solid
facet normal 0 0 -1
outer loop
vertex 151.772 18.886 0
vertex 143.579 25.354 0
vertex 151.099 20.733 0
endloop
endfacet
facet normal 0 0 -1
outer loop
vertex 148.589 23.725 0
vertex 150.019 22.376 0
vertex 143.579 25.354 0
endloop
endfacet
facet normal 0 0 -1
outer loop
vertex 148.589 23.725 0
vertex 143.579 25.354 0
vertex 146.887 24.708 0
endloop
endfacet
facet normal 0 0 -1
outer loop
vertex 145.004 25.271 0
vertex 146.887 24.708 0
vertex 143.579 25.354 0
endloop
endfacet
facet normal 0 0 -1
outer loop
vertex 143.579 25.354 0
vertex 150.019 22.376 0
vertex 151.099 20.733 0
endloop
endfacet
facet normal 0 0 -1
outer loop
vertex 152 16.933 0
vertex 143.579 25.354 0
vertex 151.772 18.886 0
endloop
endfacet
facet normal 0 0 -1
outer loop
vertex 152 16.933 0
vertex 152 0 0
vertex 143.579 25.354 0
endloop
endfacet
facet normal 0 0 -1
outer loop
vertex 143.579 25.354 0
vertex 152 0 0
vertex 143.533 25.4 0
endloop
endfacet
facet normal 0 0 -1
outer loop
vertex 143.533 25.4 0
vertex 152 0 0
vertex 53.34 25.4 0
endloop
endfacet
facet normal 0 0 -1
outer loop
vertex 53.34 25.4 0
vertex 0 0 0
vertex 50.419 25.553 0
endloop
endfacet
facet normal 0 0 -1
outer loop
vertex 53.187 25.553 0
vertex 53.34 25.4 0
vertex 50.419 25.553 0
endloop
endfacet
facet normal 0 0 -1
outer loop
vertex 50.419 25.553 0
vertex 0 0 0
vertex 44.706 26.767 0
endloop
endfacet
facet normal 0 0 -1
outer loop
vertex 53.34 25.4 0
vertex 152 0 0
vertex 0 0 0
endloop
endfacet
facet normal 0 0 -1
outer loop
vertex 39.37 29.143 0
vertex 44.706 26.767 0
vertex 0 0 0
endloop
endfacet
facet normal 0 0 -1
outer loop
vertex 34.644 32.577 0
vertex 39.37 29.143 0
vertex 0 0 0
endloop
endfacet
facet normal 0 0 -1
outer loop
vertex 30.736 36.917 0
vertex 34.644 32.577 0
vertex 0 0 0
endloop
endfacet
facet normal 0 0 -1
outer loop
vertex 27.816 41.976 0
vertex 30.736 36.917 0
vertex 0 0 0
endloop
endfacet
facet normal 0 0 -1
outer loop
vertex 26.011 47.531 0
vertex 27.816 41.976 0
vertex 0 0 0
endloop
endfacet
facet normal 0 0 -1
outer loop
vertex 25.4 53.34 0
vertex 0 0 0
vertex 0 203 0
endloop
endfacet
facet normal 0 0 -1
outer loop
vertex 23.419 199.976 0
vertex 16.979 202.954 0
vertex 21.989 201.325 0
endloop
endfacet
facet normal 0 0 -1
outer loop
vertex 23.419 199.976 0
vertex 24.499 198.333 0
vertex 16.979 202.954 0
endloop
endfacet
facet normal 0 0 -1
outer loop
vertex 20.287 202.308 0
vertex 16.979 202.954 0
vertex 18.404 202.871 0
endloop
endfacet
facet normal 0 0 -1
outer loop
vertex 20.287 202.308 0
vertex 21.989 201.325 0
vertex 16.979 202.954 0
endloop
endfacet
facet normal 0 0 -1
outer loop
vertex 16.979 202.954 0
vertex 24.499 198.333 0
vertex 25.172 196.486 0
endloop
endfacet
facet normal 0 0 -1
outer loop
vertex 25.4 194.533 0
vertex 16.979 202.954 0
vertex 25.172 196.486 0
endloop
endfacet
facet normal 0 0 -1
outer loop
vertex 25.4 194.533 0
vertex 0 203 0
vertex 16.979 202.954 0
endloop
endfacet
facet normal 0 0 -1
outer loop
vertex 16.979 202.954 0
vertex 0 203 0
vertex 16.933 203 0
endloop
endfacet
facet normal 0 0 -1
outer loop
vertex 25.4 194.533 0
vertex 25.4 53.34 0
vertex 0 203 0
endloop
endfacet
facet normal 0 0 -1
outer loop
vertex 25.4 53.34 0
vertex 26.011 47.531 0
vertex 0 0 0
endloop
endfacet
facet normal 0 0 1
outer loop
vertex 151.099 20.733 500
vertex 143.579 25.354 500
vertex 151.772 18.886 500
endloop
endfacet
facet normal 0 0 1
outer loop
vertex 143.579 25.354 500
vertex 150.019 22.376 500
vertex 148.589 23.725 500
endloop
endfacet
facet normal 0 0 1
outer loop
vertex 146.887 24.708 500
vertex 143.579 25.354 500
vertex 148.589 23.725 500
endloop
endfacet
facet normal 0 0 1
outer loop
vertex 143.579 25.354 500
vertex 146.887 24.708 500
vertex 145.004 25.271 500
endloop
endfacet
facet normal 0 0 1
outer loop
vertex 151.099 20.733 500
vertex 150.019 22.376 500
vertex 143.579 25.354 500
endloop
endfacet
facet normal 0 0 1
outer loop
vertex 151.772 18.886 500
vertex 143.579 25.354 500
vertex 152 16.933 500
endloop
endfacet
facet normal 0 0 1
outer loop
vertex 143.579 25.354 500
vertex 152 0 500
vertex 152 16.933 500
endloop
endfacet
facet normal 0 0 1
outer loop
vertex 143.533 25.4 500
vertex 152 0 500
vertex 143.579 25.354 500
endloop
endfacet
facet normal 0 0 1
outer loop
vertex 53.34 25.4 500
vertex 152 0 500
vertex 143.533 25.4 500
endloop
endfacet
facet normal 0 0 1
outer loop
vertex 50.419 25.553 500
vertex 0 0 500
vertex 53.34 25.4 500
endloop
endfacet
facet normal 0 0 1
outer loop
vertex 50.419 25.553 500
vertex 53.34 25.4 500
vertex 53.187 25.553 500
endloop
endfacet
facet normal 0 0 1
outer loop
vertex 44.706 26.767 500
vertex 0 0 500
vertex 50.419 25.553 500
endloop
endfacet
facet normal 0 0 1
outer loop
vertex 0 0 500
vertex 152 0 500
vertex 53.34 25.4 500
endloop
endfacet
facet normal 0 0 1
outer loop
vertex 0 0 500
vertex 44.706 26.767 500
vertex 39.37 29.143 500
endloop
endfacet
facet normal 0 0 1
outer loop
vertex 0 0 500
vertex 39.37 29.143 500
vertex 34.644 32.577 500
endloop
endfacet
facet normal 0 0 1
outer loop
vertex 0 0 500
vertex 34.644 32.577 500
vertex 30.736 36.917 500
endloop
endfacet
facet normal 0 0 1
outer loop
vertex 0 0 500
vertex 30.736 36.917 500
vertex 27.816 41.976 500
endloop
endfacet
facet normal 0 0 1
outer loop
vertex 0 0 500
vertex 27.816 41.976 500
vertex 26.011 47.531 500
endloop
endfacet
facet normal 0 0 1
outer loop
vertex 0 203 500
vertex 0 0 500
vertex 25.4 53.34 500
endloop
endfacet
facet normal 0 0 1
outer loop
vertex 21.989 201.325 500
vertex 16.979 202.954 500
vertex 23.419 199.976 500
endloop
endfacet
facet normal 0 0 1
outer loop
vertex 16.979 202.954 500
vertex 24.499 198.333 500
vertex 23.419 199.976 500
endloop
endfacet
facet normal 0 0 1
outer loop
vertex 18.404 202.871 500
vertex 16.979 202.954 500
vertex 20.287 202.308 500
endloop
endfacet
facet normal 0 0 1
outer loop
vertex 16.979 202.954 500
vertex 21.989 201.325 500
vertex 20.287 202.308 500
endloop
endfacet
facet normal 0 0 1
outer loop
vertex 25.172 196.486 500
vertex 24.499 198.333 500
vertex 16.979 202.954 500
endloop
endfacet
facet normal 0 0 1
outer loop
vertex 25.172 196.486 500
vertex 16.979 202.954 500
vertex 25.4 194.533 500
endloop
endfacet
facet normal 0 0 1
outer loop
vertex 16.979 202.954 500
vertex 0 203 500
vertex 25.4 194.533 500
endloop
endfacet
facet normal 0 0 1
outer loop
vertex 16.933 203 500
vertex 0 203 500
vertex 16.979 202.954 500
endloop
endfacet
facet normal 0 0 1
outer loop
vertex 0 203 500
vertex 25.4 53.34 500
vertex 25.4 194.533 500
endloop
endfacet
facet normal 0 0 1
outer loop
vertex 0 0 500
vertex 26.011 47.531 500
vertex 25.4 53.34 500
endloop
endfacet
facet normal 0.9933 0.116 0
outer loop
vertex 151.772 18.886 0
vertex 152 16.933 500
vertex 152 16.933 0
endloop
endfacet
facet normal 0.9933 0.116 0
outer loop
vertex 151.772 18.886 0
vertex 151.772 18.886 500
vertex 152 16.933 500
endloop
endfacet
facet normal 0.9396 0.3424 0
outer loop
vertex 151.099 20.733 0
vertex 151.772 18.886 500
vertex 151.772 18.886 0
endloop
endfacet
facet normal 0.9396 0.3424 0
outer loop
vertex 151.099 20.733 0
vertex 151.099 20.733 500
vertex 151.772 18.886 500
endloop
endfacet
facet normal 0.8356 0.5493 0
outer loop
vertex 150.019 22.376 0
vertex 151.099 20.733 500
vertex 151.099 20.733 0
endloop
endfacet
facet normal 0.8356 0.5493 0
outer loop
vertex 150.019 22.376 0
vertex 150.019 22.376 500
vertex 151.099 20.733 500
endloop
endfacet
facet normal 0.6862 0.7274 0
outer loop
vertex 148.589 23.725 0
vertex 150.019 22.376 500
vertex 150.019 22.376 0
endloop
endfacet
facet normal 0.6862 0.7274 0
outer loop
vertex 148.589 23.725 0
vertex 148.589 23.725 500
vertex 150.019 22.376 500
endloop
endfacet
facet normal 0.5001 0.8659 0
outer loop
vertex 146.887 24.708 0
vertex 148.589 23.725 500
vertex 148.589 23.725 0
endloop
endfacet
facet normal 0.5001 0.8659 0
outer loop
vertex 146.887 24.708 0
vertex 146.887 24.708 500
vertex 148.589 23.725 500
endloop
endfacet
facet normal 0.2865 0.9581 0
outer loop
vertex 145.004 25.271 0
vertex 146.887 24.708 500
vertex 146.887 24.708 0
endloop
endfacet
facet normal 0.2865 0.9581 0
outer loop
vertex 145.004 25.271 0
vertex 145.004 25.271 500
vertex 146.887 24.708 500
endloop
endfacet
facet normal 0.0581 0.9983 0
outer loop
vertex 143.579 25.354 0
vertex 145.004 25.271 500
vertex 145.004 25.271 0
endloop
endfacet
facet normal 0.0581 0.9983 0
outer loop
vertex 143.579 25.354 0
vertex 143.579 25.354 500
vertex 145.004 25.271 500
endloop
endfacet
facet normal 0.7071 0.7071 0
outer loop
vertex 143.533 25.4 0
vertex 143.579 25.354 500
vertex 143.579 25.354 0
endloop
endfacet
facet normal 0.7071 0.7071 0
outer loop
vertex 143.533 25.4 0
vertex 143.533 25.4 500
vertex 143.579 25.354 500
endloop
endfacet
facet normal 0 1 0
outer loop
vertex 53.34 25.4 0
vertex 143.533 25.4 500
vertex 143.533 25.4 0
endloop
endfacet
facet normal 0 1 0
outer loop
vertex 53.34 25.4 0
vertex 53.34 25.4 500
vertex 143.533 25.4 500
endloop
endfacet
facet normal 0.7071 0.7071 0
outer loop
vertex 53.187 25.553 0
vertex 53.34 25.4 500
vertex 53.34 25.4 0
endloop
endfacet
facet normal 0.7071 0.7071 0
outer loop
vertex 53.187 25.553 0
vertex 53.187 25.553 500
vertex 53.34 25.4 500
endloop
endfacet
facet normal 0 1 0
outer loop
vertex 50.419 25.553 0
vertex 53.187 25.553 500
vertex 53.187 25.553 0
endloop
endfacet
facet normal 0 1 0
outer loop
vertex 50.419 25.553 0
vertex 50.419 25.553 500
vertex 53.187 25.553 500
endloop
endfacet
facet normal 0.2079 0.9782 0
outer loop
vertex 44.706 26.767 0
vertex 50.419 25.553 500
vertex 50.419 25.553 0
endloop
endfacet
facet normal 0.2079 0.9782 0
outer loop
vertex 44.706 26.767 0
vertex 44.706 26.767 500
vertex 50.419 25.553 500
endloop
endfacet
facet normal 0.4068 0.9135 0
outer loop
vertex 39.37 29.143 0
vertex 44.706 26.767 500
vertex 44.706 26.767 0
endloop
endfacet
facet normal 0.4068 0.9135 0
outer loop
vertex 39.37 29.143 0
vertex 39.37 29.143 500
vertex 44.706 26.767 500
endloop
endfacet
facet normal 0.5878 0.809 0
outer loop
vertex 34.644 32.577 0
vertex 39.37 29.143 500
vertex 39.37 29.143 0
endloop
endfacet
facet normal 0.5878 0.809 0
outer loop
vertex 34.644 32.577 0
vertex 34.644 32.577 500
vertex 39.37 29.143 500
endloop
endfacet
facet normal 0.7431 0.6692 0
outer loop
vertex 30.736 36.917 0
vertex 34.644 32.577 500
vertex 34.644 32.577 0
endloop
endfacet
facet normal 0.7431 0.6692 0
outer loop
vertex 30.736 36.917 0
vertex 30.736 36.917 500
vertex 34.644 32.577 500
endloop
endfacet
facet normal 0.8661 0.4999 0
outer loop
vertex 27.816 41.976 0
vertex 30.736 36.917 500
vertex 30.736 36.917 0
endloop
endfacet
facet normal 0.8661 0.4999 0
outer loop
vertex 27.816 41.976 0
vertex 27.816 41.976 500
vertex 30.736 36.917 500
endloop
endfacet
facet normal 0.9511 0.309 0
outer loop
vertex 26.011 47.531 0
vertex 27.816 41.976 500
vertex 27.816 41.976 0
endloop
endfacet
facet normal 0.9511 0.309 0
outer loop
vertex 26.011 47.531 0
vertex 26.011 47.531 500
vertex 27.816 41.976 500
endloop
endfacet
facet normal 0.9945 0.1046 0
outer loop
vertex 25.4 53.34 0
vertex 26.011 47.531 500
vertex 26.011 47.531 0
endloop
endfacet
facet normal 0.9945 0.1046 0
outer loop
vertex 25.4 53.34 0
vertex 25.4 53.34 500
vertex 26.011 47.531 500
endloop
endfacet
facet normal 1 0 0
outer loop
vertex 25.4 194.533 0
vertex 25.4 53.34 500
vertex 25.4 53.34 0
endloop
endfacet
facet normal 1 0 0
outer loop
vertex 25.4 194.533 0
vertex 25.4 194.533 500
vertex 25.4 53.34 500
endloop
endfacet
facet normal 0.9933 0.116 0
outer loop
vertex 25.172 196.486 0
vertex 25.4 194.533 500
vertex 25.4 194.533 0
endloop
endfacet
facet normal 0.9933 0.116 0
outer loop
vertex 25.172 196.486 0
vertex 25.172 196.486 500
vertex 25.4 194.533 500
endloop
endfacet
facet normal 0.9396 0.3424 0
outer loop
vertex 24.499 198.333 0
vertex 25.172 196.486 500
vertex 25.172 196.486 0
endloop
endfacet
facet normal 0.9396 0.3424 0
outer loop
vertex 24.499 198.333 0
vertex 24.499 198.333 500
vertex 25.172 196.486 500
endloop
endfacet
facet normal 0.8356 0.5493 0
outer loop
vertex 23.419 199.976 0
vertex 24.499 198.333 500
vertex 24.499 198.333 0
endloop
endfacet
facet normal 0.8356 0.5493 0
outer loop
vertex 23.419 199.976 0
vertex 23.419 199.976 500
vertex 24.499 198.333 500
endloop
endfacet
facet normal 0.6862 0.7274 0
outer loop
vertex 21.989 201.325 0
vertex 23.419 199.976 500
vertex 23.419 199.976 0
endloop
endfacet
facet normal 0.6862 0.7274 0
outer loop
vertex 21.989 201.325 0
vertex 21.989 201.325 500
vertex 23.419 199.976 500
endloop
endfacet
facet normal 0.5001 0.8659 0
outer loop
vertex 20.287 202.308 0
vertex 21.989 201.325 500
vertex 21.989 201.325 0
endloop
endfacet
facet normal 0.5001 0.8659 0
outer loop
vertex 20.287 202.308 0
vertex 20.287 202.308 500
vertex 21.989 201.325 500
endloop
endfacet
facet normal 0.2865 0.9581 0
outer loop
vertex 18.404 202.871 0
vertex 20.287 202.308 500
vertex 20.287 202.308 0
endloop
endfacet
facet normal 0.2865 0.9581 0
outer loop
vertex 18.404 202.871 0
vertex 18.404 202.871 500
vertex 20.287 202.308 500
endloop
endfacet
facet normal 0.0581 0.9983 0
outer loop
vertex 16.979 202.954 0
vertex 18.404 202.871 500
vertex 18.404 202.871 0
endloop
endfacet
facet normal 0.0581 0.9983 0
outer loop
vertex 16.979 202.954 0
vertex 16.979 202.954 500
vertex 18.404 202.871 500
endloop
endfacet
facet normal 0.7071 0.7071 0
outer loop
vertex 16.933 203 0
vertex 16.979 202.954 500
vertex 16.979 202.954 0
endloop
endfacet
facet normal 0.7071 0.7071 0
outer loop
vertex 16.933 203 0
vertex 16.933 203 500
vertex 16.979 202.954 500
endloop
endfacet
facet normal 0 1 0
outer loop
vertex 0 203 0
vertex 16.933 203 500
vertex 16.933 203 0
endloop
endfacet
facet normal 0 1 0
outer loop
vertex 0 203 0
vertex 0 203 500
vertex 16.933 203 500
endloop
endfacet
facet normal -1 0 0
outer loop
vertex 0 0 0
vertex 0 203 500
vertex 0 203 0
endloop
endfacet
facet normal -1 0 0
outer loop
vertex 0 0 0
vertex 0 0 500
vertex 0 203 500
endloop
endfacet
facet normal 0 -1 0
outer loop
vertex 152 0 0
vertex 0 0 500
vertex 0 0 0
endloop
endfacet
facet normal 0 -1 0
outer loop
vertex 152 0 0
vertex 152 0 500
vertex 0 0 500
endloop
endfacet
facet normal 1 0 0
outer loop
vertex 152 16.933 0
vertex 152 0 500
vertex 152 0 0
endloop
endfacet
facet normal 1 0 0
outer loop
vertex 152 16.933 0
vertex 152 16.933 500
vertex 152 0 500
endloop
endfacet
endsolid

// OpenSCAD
module L(d,b,t,l=300,k=undef,r2=undef) {
    k = k==undef ? 2.1*t : k;  // not tabulated for angles
    r1 = k - t;     // radius of leg to leg fillet.
    r2 = r2==undef ? t/3 : r2;    // radius of leg tip fillet
    pts = [[0,0],   // heel at origin
                [b,0],   // leg in x-dir
                [b,t-r2],
                [b-r2,t],
                [t+r1,t],
                [t,t+r1],
                [t,d-r2],
                [t-r2,d],
                [0,d]];
    linear_extrude(height=l) {
        difference() {
            union() {
                polygon(pts);
                translate([t-r2,d-r2,0]) { circle(r=r2); }
                translate([b-r2,t-r2,0]) { circle(r=r2); }
            }
            translate([t+r1,t+r1,0]) {circle(r=r1);}
        }
    }
}

render()  {
    L(203,152,25.4,l=500);  // L203x152x25
}
